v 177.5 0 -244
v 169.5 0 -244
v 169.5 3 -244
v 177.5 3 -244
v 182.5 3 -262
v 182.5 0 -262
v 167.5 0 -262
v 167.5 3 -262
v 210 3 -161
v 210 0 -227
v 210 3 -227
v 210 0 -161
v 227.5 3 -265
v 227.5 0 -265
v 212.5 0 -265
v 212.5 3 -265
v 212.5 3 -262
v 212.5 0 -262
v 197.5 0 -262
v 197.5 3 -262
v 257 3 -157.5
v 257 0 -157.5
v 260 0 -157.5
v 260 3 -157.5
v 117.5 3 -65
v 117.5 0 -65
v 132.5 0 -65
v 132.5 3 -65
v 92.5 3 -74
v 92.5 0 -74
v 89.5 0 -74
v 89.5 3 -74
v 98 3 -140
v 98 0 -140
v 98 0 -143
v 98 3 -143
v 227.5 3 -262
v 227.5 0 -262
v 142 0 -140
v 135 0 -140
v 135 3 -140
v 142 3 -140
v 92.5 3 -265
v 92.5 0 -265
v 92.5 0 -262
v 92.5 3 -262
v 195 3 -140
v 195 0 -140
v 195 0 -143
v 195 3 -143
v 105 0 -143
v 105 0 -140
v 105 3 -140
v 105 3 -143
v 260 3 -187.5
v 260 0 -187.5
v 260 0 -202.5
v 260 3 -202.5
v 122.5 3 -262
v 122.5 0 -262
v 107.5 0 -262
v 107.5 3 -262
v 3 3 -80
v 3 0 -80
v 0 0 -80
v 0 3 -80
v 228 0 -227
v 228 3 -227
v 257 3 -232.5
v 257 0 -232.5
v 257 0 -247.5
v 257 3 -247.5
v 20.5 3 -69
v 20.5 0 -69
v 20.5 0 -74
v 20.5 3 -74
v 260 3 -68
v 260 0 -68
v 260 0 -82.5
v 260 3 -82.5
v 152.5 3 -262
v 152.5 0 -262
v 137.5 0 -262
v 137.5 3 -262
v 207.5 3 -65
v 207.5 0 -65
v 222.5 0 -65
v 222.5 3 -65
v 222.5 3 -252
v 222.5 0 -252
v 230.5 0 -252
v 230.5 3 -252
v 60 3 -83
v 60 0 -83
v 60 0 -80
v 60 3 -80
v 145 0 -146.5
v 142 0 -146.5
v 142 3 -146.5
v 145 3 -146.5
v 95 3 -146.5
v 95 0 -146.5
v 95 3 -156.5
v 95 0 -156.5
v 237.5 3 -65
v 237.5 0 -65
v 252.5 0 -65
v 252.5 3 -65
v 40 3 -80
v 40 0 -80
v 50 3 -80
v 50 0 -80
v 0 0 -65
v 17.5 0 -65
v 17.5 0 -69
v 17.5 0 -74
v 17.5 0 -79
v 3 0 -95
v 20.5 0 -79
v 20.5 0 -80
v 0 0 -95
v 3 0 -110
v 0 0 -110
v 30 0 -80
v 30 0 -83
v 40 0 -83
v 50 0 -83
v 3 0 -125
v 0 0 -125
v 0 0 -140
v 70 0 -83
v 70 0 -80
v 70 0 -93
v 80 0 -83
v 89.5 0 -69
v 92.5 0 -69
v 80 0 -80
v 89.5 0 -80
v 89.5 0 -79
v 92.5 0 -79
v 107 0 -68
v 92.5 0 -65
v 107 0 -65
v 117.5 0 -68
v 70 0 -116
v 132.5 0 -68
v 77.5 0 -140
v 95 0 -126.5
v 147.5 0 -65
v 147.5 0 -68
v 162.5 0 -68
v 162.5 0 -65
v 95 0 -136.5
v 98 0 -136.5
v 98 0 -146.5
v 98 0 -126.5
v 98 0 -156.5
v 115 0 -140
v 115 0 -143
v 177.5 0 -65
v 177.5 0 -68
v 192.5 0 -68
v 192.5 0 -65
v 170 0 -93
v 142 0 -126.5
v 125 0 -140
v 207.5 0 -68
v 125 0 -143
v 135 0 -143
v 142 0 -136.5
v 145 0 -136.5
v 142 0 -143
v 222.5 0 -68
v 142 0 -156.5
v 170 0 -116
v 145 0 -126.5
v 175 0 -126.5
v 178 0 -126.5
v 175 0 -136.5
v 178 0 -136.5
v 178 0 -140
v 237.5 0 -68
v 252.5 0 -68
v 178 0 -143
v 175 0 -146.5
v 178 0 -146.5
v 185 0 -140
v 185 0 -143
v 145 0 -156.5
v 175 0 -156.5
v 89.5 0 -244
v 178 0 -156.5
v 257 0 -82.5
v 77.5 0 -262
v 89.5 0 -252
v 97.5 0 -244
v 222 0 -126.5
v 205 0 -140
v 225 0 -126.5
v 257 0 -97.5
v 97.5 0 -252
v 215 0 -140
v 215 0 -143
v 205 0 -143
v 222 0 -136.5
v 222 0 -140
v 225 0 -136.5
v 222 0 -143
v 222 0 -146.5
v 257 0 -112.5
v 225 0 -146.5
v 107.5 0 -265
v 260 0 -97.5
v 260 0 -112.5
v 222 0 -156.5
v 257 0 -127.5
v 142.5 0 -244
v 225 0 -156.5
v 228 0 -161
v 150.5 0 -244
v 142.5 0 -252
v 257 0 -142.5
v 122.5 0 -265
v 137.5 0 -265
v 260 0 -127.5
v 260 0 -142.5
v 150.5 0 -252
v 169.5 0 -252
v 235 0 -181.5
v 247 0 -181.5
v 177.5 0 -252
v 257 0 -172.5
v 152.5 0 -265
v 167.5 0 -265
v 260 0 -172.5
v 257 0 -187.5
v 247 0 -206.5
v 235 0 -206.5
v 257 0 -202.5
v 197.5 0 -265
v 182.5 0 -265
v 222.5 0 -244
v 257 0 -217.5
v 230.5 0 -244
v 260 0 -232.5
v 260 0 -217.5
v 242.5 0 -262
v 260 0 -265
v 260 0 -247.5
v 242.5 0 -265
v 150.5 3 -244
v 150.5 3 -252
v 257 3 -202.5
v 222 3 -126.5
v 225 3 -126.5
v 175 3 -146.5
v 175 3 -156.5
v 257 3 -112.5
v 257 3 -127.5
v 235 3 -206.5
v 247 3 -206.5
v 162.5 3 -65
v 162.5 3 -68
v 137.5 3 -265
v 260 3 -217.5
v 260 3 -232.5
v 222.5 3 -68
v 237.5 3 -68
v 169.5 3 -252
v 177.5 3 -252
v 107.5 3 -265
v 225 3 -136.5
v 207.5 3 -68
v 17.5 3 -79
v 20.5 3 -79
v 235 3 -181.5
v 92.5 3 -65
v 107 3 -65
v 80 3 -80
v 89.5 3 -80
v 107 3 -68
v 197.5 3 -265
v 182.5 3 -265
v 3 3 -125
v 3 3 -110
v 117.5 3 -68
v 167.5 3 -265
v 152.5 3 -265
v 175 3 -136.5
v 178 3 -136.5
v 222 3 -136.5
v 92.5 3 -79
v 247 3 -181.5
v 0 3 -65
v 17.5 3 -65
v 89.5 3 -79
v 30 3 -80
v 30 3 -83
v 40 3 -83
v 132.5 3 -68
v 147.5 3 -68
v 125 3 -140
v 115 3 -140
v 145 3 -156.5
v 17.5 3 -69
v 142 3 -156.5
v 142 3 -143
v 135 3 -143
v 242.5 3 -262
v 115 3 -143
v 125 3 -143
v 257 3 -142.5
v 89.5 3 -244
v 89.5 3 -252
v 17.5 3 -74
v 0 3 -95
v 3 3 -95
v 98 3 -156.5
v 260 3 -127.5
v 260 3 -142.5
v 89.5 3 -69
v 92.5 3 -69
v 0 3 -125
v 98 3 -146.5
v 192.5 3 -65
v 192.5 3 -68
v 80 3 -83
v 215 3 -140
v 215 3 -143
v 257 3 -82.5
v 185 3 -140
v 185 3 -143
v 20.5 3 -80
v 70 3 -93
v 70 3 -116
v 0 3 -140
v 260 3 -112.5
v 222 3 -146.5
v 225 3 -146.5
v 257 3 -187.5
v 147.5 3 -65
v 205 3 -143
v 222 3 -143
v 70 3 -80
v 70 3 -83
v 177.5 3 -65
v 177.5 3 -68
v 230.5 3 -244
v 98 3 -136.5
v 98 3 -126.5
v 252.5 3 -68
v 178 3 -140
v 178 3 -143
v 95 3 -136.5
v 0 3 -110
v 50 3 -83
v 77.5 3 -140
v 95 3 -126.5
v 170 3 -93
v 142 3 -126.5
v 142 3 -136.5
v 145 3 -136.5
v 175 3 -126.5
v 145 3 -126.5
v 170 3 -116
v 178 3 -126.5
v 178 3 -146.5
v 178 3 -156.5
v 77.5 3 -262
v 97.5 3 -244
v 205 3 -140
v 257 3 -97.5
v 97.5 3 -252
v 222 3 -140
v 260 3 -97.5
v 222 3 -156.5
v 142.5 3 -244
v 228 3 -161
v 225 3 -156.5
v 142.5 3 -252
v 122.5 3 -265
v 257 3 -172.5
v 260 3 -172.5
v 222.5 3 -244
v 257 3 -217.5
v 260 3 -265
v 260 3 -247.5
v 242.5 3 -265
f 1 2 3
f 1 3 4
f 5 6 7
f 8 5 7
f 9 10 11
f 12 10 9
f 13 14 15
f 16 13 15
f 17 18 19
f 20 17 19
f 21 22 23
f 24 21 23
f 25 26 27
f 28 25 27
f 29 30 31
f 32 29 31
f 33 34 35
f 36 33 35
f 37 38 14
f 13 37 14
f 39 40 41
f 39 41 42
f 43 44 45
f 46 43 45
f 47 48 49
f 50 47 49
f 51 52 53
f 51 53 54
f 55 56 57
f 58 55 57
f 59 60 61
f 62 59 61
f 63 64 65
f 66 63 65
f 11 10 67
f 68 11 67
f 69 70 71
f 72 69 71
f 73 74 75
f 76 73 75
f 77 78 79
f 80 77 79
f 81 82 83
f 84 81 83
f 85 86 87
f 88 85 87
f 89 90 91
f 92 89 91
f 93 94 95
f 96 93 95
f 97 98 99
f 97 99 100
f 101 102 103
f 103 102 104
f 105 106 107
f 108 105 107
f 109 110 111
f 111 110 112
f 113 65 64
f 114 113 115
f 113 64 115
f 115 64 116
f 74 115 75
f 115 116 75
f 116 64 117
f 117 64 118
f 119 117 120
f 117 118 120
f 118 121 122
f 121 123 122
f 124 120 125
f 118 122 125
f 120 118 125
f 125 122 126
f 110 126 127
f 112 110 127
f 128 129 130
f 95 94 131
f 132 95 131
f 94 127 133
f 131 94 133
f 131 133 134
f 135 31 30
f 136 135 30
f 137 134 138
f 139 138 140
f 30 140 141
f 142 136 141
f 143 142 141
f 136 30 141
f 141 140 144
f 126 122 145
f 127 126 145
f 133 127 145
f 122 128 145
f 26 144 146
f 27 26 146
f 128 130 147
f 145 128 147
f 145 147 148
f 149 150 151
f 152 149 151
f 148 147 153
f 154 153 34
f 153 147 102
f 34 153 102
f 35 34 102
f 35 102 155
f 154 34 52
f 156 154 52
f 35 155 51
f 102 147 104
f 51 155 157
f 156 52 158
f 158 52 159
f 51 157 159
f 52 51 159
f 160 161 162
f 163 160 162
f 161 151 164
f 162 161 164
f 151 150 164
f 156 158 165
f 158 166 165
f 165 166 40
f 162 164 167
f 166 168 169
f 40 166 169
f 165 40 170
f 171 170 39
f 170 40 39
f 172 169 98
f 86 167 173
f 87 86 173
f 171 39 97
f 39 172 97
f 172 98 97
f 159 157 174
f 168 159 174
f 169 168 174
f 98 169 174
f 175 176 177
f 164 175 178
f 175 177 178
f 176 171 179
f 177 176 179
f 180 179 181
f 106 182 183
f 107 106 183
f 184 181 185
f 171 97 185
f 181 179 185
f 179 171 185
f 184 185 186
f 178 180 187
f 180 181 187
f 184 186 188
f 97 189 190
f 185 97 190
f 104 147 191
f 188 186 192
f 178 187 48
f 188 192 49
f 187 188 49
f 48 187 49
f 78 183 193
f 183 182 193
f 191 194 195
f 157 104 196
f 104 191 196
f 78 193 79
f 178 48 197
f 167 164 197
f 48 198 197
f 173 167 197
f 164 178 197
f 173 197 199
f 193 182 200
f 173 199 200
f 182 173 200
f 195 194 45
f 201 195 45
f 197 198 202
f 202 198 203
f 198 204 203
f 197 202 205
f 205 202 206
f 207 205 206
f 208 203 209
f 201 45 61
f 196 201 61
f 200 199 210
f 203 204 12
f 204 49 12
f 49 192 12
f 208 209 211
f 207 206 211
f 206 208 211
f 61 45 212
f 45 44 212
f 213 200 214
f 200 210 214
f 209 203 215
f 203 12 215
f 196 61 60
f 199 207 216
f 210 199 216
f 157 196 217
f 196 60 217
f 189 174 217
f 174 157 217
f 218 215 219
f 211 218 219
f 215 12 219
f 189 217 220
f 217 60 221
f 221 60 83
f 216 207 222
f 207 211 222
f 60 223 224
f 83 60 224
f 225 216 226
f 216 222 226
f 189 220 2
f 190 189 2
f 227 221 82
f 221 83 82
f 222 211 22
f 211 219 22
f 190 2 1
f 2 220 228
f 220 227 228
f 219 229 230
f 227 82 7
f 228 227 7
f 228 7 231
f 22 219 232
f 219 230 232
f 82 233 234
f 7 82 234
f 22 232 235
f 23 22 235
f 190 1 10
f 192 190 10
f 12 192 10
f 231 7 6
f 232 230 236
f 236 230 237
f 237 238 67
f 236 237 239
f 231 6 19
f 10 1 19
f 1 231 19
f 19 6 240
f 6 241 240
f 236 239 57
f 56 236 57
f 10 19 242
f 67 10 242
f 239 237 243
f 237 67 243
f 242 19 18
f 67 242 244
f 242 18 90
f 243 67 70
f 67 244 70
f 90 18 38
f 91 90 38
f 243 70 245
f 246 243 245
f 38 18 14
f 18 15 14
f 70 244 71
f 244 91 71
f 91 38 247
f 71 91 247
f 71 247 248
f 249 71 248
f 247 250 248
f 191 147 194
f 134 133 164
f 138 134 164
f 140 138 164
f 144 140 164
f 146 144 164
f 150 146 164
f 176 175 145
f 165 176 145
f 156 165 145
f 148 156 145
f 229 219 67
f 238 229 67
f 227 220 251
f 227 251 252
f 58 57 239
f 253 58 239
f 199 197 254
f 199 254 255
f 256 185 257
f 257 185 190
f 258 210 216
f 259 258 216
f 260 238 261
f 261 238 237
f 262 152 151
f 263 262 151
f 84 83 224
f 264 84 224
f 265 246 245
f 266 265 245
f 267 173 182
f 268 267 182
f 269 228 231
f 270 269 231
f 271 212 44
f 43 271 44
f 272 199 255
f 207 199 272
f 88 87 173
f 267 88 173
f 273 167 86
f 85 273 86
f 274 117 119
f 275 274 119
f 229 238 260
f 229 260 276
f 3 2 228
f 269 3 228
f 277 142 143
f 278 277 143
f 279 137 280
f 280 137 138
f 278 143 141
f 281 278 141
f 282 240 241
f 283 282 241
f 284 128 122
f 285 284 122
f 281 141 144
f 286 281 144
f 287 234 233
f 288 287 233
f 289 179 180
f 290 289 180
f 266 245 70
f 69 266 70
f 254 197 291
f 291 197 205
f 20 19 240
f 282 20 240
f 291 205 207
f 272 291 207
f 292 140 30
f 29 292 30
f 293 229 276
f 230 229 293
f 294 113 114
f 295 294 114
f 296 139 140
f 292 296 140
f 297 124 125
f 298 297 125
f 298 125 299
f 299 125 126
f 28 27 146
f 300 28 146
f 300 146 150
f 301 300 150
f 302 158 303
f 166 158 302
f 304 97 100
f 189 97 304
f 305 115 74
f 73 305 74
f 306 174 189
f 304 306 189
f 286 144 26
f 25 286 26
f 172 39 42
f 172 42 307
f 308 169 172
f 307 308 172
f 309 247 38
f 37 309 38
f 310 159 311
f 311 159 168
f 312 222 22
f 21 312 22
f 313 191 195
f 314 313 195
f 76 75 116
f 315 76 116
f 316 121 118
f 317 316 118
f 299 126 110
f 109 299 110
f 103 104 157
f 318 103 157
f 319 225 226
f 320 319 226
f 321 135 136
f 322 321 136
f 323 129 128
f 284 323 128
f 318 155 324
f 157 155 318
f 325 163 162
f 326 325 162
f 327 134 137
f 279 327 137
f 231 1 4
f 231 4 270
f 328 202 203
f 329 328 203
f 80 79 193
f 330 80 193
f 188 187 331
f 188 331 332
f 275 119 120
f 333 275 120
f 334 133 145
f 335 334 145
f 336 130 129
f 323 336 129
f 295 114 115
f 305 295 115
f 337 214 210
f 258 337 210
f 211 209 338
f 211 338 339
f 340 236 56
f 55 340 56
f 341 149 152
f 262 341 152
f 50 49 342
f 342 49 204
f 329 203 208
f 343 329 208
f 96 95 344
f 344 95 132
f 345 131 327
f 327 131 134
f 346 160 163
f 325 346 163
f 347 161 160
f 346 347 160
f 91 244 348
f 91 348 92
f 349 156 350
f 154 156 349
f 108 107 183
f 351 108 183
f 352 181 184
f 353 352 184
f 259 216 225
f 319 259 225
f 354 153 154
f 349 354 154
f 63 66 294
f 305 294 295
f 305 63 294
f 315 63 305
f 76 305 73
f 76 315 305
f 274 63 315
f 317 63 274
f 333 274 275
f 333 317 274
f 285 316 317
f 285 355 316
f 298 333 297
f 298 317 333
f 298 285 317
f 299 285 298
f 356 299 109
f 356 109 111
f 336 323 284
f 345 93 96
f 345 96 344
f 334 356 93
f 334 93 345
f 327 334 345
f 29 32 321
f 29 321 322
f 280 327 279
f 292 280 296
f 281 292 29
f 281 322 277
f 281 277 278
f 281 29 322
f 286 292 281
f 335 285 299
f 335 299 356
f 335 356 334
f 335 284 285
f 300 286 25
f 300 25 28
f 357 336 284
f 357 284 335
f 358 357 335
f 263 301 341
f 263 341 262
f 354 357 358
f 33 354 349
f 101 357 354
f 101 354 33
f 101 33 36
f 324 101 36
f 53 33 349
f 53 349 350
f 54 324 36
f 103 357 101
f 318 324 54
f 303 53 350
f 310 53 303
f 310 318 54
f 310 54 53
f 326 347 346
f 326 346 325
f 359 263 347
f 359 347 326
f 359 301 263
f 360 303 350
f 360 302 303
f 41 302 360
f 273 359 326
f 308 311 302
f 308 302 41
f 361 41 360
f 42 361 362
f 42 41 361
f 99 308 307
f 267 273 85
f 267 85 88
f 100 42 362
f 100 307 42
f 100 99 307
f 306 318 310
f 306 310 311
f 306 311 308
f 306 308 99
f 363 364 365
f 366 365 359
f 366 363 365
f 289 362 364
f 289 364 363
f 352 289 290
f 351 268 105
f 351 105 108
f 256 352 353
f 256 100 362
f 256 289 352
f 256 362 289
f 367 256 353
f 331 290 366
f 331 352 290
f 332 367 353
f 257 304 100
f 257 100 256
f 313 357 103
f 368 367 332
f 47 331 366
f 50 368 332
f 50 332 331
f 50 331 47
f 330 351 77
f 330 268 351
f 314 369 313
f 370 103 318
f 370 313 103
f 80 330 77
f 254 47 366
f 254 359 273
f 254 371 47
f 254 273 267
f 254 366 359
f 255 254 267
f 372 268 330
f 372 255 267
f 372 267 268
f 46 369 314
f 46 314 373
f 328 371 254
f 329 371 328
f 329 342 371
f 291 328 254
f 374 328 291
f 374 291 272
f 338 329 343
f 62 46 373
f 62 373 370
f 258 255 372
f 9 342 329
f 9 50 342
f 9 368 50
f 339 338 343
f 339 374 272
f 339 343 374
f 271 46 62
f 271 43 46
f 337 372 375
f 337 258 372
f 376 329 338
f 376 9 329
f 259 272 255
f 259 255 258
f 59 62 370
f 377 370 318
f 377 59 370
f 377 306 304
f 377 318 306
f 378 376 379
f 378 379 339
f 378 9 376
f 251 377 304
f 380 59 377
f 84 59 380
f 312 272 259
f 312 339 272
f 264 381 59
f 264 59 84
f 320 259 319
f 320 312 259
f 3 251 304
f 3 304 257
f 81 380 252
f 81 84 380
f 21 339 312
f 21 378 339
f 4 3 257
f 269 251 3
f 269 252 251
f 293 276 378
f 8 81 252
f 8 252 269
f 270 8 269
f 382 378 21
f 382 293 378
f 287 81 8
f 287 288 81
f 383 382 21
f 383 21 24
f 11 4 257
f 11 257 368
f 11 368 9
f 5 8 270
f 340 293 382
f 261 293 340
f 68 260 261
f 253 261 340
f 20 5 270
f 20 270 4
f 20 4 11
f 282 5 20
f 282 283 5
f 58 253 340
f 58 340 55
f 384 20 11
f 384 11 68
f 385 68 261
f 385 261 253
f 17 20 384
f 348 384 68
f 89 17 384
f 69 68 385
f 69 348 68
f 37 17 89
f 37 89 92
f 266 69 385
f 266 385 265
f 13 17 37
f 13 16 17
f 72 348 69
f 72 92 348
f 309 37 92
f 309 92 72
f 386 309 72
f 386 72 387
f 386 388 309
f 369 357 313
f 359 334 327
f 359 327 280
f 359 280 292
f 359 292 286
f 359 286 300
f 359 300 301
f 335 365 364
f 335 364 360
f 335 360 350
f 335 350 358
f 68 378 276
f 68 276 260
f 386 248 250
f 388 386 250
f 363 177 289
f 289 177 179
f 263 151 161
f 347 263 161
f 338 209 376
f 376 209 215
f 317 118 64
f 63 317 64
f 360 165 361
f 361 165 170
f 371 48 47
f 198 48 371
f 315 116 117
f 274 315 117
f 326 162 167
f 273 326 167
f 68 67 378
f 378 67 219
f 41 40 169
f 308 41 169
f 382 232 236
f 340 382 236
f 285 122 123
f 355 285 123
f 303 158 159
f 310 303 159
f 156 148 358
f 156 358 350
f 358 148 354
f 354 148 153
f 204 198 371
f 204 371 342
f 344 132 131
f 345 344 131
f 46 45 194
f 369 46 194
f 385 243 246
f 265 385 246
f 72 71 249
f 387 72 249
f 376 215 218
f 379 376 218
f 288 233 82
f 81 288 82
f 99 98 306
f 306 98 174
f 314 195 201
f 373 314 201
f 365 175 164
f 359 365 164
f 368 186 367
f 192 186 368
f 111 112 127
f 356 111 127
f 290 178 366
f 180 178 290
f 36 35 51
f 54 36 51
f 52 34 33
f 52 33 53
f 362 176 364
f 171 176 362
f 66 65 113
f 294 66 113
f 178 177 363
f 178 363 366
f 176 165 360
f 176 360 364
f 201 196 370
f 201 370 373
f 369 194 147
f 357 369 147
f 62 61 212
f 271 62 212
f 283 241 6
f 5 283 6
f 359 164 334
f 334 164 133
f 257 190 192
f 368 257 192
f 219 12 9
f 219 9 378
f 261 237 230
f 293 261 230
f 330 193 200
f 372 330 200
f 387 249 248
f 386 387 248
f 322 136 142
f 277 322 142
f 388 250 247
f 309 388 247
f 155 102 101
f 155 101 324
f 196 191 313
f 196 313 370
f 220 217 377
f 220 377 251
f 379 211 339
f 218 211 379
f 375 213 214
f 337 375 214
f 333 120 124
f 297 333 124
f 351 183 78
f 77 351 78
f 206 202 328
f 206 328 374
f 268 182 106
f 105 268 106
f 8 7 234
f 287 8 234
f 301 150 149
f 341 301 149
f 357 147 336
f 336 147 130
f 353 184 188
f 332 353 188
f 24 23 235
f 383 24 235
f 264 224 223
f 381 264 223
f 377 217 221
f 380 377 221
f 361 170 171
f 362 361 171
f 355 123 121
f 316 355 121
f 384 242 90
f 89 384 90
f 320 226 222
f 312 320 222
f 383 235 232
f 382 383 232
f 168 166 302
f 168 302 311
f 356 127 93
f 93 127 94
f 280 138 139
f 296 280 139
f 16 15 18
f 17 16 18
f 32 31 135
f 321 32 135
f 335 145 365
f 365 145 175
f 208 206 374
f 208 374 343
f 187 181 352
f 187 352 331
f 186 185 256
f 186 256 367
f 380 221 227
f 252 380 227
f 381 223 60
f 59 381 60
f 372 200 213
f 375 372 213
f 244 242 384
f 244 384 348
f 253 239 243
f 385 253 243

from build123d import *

# Parameters (mm, degrees)
CROQUIS1_W              = 10
CROQUIS1_H              = 3
CROQUIS1_W_2            = 3
CROQUIS1_H_2            = 10
CROQUIS1_W_3            = 7
CROQUIS1_W_4            = 8
CROQUIS1_H_3            = 8
SALIENTE_EXTRUIR1_DEPTH = 3
SKETCH1_W               = 12
SKETCH1_H               = 25
SKETCH1_W_2             = 18
SKETCH1_H_2             = 66
CUT_EXTRUDE2_DEPTH      = 10


with BuildPart() as part:
    # Croquis1 → Saliente-Extruir1 (new body)
    with BuildSketch(Plane(origin=(0, 0, 0), x_dir=(1, 0, 0), z_dir=(0, 1, 0))):
        Polygon((17.5, 79), (20.5, 79), (20.5, 80), (25.626440042, 80), (30, 80), (30, 83), (40, 83), (40, 80), (50, 80), (50, 83), (60, 83), (60, 80), (70, 80), (70, 83), (80, 83), (80, 80), (84.373559958, 80), (89.5, 80), (89.5, 79), (92.5, 79), (92.5, 74), (89.5, 74), (89.5, 69), (92.5, 69), (92.5, 65), (107, 65), (107, 68), (117.5, 68), (117.5, 65), (132.5, 65), (132.5, 68), (147.5, 68), (147.5, 65), (162.5, 65), (162.5, 68), (177.5, 68), (177.5, 65), (192.5, 65), (192.5, 68), (207.5, 68), (207.5, 65), (222.5, 65), (222.5, 68), (237.5, 68), (237.5, 65), (252.5, 65), (252.5, 68), (260, 68), (260, 82.5), (257, 82.5), (257, 97.5), (260, 97.5), (260, 112.5), (257, 112.5), (257, 127.5), (260, 127.5), (260, 142.5), (257, 142.5), (257, 157.5), (260, 157.5), (260, 172.5), (257, 172.5), (257, 187.5), (260, 187.5), (260, 202.5), (257, 202.5), (257, 217.5), (260, 217.5), (260, 232.5), (257, 232.5), (257, 247.5), (260, 247.5), (260, 265), (242.5, 265), (242.5, 262), (227.5, 262), (227.5, 265), (212.5, 265), (212.5, 262), (197.5, 262), (197.5, 265), (182.5, 265), (182.5, 262), (167.5, 262), (167.5, 265), (152.5, 265), (152.5, 262), (137.5, 262), (137.5, 265), (122.5, 265), (122.5, 262), (107.5, 262), (107.5, 265), (92.5, 265), (92.5, 262), (77.5, 262), (77.5, 155), (77.5, 140), (3, 140), (0, 140), (0, 125), (3, 125), (3, 110), (0, 110), (0, 95), (3, 95), (3, 80), (0, 80), (0, 65), (17.5, 65), (17.5, 69), (20.5, 69), (20.5, 74), (17.5, 74), align=None)
        with Locations((120, 141.5)):
            Rectangle(CROQUIS1_W, CROQUIS1_H, mode=Mode.SUBTRACT)
        Polygon((120, 93), (70, 93), (70, 116), (170, 116), (170, 93), align=None, mode=Mode.SUBTRACT)
        with Locations((200, 141.5)):
            Rectangle(CROQUIS1_W, CROQUIS1_H, mode=Mode.SUBTRACT)
        with Locations((96.5, 151.5)):
            Rectangle(CROQUIS1_W_2, CROQUIS1_H_2, mode=Mode.SUBTRACT)
        with Locations((96.5, 131.5)):
            Rectangle(CROQUIS1_W_2, CROQUIS1_H_2, mode=Mode.SUBTRACT)
        with Locations((101.5, 141.5)):
            Rectangle(CROQUIS1_W_3, CROQUIS1_H, mode=Mode.SUBTRACT)
        with Locations((143.5, 151.5)):
            Rectangle(CROQUIS1_W_2, CROQUIS1_H_2, mode=Mode.SUBTRACT)
        with Locations((143.5, 131.5)):
            Rectangle(CROQUIS1_W_2, CROQUIS1_H_2, mode=Mode.SUBTRACT)
        with Locations((176.5, 151.5)):
            Rectangle(CROQUIS1_W_2, CROQUIS1_H_2, mode=Mode.SUBTRACT)
        with Locations((138.5, 141.5)):
            Rectangle(CROQUIS1_W_3, CROQUIS1_H, mode=Mode.SUBTRACT)
        with Locations((181.5, 141.5)):
            Rectangle(CROQUIS1_W_3, CROQUIS1_H, mode=Mode.SUBTRACT)
        with Locations((223.5, 151.5)):
            Rectangle(CROQUIS1_W_2, CROQUIS1_H_2, mode=Mode.SUBTRACT)
        with Locations((218.5, 141.5)):
            Rectangle(CROQUIS1_W_3, CROQUIS1_H, mode=Mode.SUBTRACT)
        with Locations((176.5, 131.5)):
            Rectangle(CROQUIS1_W_2, CROQUIS1_H_2, mode=Mode.SUBTRACT)
        with Locations((223.5, 131.5)):
            Rectangle(CROQUIS1_W_2, CROQUIS1_H_2, mode=Mode.SUBTRACT)
        with Locations((93.5, 248)):
            Rectangle(CROQUIS1_W_4, CROQUIS1_H_3, mode=Mode.SUBTRACT)
        with Locations((146.5, 248)):
            Rectangle(CROQUIS1_W_4, CROQUIS1_H_3, mode=Mode.SUBTRACT)
        with Locations((173.5, 248)):
            Rectangle(CROQUIS1_W_4, CROQUIS1_H_3, mode=Mode.SUBTRACT)
        with Locations((226.5, 248)):
            Rectangle(CROQUIS1_W_4, CROQUIS1_H_3, mode=Mode.SUBTRACT)
    extrude(amount=SALIENTE_EXTRUIR1_DEPTH)

    # Sketch1 → Cut-Extrude2 (cut)
    with BuildSketch(Plane.XZ):
        with Locations((241, -194)):
            Rectangle(SKETCH1_W, SKETCH1_H)
        with Locations((219, -194)):
            Rectangle(SKETCH1_W_2, SKETCH1_H_2)
    extrude(amount=-CUT_EXTRUDE2_DEPTH, mode=Mode.SUBTRACT)


solid = part.part
